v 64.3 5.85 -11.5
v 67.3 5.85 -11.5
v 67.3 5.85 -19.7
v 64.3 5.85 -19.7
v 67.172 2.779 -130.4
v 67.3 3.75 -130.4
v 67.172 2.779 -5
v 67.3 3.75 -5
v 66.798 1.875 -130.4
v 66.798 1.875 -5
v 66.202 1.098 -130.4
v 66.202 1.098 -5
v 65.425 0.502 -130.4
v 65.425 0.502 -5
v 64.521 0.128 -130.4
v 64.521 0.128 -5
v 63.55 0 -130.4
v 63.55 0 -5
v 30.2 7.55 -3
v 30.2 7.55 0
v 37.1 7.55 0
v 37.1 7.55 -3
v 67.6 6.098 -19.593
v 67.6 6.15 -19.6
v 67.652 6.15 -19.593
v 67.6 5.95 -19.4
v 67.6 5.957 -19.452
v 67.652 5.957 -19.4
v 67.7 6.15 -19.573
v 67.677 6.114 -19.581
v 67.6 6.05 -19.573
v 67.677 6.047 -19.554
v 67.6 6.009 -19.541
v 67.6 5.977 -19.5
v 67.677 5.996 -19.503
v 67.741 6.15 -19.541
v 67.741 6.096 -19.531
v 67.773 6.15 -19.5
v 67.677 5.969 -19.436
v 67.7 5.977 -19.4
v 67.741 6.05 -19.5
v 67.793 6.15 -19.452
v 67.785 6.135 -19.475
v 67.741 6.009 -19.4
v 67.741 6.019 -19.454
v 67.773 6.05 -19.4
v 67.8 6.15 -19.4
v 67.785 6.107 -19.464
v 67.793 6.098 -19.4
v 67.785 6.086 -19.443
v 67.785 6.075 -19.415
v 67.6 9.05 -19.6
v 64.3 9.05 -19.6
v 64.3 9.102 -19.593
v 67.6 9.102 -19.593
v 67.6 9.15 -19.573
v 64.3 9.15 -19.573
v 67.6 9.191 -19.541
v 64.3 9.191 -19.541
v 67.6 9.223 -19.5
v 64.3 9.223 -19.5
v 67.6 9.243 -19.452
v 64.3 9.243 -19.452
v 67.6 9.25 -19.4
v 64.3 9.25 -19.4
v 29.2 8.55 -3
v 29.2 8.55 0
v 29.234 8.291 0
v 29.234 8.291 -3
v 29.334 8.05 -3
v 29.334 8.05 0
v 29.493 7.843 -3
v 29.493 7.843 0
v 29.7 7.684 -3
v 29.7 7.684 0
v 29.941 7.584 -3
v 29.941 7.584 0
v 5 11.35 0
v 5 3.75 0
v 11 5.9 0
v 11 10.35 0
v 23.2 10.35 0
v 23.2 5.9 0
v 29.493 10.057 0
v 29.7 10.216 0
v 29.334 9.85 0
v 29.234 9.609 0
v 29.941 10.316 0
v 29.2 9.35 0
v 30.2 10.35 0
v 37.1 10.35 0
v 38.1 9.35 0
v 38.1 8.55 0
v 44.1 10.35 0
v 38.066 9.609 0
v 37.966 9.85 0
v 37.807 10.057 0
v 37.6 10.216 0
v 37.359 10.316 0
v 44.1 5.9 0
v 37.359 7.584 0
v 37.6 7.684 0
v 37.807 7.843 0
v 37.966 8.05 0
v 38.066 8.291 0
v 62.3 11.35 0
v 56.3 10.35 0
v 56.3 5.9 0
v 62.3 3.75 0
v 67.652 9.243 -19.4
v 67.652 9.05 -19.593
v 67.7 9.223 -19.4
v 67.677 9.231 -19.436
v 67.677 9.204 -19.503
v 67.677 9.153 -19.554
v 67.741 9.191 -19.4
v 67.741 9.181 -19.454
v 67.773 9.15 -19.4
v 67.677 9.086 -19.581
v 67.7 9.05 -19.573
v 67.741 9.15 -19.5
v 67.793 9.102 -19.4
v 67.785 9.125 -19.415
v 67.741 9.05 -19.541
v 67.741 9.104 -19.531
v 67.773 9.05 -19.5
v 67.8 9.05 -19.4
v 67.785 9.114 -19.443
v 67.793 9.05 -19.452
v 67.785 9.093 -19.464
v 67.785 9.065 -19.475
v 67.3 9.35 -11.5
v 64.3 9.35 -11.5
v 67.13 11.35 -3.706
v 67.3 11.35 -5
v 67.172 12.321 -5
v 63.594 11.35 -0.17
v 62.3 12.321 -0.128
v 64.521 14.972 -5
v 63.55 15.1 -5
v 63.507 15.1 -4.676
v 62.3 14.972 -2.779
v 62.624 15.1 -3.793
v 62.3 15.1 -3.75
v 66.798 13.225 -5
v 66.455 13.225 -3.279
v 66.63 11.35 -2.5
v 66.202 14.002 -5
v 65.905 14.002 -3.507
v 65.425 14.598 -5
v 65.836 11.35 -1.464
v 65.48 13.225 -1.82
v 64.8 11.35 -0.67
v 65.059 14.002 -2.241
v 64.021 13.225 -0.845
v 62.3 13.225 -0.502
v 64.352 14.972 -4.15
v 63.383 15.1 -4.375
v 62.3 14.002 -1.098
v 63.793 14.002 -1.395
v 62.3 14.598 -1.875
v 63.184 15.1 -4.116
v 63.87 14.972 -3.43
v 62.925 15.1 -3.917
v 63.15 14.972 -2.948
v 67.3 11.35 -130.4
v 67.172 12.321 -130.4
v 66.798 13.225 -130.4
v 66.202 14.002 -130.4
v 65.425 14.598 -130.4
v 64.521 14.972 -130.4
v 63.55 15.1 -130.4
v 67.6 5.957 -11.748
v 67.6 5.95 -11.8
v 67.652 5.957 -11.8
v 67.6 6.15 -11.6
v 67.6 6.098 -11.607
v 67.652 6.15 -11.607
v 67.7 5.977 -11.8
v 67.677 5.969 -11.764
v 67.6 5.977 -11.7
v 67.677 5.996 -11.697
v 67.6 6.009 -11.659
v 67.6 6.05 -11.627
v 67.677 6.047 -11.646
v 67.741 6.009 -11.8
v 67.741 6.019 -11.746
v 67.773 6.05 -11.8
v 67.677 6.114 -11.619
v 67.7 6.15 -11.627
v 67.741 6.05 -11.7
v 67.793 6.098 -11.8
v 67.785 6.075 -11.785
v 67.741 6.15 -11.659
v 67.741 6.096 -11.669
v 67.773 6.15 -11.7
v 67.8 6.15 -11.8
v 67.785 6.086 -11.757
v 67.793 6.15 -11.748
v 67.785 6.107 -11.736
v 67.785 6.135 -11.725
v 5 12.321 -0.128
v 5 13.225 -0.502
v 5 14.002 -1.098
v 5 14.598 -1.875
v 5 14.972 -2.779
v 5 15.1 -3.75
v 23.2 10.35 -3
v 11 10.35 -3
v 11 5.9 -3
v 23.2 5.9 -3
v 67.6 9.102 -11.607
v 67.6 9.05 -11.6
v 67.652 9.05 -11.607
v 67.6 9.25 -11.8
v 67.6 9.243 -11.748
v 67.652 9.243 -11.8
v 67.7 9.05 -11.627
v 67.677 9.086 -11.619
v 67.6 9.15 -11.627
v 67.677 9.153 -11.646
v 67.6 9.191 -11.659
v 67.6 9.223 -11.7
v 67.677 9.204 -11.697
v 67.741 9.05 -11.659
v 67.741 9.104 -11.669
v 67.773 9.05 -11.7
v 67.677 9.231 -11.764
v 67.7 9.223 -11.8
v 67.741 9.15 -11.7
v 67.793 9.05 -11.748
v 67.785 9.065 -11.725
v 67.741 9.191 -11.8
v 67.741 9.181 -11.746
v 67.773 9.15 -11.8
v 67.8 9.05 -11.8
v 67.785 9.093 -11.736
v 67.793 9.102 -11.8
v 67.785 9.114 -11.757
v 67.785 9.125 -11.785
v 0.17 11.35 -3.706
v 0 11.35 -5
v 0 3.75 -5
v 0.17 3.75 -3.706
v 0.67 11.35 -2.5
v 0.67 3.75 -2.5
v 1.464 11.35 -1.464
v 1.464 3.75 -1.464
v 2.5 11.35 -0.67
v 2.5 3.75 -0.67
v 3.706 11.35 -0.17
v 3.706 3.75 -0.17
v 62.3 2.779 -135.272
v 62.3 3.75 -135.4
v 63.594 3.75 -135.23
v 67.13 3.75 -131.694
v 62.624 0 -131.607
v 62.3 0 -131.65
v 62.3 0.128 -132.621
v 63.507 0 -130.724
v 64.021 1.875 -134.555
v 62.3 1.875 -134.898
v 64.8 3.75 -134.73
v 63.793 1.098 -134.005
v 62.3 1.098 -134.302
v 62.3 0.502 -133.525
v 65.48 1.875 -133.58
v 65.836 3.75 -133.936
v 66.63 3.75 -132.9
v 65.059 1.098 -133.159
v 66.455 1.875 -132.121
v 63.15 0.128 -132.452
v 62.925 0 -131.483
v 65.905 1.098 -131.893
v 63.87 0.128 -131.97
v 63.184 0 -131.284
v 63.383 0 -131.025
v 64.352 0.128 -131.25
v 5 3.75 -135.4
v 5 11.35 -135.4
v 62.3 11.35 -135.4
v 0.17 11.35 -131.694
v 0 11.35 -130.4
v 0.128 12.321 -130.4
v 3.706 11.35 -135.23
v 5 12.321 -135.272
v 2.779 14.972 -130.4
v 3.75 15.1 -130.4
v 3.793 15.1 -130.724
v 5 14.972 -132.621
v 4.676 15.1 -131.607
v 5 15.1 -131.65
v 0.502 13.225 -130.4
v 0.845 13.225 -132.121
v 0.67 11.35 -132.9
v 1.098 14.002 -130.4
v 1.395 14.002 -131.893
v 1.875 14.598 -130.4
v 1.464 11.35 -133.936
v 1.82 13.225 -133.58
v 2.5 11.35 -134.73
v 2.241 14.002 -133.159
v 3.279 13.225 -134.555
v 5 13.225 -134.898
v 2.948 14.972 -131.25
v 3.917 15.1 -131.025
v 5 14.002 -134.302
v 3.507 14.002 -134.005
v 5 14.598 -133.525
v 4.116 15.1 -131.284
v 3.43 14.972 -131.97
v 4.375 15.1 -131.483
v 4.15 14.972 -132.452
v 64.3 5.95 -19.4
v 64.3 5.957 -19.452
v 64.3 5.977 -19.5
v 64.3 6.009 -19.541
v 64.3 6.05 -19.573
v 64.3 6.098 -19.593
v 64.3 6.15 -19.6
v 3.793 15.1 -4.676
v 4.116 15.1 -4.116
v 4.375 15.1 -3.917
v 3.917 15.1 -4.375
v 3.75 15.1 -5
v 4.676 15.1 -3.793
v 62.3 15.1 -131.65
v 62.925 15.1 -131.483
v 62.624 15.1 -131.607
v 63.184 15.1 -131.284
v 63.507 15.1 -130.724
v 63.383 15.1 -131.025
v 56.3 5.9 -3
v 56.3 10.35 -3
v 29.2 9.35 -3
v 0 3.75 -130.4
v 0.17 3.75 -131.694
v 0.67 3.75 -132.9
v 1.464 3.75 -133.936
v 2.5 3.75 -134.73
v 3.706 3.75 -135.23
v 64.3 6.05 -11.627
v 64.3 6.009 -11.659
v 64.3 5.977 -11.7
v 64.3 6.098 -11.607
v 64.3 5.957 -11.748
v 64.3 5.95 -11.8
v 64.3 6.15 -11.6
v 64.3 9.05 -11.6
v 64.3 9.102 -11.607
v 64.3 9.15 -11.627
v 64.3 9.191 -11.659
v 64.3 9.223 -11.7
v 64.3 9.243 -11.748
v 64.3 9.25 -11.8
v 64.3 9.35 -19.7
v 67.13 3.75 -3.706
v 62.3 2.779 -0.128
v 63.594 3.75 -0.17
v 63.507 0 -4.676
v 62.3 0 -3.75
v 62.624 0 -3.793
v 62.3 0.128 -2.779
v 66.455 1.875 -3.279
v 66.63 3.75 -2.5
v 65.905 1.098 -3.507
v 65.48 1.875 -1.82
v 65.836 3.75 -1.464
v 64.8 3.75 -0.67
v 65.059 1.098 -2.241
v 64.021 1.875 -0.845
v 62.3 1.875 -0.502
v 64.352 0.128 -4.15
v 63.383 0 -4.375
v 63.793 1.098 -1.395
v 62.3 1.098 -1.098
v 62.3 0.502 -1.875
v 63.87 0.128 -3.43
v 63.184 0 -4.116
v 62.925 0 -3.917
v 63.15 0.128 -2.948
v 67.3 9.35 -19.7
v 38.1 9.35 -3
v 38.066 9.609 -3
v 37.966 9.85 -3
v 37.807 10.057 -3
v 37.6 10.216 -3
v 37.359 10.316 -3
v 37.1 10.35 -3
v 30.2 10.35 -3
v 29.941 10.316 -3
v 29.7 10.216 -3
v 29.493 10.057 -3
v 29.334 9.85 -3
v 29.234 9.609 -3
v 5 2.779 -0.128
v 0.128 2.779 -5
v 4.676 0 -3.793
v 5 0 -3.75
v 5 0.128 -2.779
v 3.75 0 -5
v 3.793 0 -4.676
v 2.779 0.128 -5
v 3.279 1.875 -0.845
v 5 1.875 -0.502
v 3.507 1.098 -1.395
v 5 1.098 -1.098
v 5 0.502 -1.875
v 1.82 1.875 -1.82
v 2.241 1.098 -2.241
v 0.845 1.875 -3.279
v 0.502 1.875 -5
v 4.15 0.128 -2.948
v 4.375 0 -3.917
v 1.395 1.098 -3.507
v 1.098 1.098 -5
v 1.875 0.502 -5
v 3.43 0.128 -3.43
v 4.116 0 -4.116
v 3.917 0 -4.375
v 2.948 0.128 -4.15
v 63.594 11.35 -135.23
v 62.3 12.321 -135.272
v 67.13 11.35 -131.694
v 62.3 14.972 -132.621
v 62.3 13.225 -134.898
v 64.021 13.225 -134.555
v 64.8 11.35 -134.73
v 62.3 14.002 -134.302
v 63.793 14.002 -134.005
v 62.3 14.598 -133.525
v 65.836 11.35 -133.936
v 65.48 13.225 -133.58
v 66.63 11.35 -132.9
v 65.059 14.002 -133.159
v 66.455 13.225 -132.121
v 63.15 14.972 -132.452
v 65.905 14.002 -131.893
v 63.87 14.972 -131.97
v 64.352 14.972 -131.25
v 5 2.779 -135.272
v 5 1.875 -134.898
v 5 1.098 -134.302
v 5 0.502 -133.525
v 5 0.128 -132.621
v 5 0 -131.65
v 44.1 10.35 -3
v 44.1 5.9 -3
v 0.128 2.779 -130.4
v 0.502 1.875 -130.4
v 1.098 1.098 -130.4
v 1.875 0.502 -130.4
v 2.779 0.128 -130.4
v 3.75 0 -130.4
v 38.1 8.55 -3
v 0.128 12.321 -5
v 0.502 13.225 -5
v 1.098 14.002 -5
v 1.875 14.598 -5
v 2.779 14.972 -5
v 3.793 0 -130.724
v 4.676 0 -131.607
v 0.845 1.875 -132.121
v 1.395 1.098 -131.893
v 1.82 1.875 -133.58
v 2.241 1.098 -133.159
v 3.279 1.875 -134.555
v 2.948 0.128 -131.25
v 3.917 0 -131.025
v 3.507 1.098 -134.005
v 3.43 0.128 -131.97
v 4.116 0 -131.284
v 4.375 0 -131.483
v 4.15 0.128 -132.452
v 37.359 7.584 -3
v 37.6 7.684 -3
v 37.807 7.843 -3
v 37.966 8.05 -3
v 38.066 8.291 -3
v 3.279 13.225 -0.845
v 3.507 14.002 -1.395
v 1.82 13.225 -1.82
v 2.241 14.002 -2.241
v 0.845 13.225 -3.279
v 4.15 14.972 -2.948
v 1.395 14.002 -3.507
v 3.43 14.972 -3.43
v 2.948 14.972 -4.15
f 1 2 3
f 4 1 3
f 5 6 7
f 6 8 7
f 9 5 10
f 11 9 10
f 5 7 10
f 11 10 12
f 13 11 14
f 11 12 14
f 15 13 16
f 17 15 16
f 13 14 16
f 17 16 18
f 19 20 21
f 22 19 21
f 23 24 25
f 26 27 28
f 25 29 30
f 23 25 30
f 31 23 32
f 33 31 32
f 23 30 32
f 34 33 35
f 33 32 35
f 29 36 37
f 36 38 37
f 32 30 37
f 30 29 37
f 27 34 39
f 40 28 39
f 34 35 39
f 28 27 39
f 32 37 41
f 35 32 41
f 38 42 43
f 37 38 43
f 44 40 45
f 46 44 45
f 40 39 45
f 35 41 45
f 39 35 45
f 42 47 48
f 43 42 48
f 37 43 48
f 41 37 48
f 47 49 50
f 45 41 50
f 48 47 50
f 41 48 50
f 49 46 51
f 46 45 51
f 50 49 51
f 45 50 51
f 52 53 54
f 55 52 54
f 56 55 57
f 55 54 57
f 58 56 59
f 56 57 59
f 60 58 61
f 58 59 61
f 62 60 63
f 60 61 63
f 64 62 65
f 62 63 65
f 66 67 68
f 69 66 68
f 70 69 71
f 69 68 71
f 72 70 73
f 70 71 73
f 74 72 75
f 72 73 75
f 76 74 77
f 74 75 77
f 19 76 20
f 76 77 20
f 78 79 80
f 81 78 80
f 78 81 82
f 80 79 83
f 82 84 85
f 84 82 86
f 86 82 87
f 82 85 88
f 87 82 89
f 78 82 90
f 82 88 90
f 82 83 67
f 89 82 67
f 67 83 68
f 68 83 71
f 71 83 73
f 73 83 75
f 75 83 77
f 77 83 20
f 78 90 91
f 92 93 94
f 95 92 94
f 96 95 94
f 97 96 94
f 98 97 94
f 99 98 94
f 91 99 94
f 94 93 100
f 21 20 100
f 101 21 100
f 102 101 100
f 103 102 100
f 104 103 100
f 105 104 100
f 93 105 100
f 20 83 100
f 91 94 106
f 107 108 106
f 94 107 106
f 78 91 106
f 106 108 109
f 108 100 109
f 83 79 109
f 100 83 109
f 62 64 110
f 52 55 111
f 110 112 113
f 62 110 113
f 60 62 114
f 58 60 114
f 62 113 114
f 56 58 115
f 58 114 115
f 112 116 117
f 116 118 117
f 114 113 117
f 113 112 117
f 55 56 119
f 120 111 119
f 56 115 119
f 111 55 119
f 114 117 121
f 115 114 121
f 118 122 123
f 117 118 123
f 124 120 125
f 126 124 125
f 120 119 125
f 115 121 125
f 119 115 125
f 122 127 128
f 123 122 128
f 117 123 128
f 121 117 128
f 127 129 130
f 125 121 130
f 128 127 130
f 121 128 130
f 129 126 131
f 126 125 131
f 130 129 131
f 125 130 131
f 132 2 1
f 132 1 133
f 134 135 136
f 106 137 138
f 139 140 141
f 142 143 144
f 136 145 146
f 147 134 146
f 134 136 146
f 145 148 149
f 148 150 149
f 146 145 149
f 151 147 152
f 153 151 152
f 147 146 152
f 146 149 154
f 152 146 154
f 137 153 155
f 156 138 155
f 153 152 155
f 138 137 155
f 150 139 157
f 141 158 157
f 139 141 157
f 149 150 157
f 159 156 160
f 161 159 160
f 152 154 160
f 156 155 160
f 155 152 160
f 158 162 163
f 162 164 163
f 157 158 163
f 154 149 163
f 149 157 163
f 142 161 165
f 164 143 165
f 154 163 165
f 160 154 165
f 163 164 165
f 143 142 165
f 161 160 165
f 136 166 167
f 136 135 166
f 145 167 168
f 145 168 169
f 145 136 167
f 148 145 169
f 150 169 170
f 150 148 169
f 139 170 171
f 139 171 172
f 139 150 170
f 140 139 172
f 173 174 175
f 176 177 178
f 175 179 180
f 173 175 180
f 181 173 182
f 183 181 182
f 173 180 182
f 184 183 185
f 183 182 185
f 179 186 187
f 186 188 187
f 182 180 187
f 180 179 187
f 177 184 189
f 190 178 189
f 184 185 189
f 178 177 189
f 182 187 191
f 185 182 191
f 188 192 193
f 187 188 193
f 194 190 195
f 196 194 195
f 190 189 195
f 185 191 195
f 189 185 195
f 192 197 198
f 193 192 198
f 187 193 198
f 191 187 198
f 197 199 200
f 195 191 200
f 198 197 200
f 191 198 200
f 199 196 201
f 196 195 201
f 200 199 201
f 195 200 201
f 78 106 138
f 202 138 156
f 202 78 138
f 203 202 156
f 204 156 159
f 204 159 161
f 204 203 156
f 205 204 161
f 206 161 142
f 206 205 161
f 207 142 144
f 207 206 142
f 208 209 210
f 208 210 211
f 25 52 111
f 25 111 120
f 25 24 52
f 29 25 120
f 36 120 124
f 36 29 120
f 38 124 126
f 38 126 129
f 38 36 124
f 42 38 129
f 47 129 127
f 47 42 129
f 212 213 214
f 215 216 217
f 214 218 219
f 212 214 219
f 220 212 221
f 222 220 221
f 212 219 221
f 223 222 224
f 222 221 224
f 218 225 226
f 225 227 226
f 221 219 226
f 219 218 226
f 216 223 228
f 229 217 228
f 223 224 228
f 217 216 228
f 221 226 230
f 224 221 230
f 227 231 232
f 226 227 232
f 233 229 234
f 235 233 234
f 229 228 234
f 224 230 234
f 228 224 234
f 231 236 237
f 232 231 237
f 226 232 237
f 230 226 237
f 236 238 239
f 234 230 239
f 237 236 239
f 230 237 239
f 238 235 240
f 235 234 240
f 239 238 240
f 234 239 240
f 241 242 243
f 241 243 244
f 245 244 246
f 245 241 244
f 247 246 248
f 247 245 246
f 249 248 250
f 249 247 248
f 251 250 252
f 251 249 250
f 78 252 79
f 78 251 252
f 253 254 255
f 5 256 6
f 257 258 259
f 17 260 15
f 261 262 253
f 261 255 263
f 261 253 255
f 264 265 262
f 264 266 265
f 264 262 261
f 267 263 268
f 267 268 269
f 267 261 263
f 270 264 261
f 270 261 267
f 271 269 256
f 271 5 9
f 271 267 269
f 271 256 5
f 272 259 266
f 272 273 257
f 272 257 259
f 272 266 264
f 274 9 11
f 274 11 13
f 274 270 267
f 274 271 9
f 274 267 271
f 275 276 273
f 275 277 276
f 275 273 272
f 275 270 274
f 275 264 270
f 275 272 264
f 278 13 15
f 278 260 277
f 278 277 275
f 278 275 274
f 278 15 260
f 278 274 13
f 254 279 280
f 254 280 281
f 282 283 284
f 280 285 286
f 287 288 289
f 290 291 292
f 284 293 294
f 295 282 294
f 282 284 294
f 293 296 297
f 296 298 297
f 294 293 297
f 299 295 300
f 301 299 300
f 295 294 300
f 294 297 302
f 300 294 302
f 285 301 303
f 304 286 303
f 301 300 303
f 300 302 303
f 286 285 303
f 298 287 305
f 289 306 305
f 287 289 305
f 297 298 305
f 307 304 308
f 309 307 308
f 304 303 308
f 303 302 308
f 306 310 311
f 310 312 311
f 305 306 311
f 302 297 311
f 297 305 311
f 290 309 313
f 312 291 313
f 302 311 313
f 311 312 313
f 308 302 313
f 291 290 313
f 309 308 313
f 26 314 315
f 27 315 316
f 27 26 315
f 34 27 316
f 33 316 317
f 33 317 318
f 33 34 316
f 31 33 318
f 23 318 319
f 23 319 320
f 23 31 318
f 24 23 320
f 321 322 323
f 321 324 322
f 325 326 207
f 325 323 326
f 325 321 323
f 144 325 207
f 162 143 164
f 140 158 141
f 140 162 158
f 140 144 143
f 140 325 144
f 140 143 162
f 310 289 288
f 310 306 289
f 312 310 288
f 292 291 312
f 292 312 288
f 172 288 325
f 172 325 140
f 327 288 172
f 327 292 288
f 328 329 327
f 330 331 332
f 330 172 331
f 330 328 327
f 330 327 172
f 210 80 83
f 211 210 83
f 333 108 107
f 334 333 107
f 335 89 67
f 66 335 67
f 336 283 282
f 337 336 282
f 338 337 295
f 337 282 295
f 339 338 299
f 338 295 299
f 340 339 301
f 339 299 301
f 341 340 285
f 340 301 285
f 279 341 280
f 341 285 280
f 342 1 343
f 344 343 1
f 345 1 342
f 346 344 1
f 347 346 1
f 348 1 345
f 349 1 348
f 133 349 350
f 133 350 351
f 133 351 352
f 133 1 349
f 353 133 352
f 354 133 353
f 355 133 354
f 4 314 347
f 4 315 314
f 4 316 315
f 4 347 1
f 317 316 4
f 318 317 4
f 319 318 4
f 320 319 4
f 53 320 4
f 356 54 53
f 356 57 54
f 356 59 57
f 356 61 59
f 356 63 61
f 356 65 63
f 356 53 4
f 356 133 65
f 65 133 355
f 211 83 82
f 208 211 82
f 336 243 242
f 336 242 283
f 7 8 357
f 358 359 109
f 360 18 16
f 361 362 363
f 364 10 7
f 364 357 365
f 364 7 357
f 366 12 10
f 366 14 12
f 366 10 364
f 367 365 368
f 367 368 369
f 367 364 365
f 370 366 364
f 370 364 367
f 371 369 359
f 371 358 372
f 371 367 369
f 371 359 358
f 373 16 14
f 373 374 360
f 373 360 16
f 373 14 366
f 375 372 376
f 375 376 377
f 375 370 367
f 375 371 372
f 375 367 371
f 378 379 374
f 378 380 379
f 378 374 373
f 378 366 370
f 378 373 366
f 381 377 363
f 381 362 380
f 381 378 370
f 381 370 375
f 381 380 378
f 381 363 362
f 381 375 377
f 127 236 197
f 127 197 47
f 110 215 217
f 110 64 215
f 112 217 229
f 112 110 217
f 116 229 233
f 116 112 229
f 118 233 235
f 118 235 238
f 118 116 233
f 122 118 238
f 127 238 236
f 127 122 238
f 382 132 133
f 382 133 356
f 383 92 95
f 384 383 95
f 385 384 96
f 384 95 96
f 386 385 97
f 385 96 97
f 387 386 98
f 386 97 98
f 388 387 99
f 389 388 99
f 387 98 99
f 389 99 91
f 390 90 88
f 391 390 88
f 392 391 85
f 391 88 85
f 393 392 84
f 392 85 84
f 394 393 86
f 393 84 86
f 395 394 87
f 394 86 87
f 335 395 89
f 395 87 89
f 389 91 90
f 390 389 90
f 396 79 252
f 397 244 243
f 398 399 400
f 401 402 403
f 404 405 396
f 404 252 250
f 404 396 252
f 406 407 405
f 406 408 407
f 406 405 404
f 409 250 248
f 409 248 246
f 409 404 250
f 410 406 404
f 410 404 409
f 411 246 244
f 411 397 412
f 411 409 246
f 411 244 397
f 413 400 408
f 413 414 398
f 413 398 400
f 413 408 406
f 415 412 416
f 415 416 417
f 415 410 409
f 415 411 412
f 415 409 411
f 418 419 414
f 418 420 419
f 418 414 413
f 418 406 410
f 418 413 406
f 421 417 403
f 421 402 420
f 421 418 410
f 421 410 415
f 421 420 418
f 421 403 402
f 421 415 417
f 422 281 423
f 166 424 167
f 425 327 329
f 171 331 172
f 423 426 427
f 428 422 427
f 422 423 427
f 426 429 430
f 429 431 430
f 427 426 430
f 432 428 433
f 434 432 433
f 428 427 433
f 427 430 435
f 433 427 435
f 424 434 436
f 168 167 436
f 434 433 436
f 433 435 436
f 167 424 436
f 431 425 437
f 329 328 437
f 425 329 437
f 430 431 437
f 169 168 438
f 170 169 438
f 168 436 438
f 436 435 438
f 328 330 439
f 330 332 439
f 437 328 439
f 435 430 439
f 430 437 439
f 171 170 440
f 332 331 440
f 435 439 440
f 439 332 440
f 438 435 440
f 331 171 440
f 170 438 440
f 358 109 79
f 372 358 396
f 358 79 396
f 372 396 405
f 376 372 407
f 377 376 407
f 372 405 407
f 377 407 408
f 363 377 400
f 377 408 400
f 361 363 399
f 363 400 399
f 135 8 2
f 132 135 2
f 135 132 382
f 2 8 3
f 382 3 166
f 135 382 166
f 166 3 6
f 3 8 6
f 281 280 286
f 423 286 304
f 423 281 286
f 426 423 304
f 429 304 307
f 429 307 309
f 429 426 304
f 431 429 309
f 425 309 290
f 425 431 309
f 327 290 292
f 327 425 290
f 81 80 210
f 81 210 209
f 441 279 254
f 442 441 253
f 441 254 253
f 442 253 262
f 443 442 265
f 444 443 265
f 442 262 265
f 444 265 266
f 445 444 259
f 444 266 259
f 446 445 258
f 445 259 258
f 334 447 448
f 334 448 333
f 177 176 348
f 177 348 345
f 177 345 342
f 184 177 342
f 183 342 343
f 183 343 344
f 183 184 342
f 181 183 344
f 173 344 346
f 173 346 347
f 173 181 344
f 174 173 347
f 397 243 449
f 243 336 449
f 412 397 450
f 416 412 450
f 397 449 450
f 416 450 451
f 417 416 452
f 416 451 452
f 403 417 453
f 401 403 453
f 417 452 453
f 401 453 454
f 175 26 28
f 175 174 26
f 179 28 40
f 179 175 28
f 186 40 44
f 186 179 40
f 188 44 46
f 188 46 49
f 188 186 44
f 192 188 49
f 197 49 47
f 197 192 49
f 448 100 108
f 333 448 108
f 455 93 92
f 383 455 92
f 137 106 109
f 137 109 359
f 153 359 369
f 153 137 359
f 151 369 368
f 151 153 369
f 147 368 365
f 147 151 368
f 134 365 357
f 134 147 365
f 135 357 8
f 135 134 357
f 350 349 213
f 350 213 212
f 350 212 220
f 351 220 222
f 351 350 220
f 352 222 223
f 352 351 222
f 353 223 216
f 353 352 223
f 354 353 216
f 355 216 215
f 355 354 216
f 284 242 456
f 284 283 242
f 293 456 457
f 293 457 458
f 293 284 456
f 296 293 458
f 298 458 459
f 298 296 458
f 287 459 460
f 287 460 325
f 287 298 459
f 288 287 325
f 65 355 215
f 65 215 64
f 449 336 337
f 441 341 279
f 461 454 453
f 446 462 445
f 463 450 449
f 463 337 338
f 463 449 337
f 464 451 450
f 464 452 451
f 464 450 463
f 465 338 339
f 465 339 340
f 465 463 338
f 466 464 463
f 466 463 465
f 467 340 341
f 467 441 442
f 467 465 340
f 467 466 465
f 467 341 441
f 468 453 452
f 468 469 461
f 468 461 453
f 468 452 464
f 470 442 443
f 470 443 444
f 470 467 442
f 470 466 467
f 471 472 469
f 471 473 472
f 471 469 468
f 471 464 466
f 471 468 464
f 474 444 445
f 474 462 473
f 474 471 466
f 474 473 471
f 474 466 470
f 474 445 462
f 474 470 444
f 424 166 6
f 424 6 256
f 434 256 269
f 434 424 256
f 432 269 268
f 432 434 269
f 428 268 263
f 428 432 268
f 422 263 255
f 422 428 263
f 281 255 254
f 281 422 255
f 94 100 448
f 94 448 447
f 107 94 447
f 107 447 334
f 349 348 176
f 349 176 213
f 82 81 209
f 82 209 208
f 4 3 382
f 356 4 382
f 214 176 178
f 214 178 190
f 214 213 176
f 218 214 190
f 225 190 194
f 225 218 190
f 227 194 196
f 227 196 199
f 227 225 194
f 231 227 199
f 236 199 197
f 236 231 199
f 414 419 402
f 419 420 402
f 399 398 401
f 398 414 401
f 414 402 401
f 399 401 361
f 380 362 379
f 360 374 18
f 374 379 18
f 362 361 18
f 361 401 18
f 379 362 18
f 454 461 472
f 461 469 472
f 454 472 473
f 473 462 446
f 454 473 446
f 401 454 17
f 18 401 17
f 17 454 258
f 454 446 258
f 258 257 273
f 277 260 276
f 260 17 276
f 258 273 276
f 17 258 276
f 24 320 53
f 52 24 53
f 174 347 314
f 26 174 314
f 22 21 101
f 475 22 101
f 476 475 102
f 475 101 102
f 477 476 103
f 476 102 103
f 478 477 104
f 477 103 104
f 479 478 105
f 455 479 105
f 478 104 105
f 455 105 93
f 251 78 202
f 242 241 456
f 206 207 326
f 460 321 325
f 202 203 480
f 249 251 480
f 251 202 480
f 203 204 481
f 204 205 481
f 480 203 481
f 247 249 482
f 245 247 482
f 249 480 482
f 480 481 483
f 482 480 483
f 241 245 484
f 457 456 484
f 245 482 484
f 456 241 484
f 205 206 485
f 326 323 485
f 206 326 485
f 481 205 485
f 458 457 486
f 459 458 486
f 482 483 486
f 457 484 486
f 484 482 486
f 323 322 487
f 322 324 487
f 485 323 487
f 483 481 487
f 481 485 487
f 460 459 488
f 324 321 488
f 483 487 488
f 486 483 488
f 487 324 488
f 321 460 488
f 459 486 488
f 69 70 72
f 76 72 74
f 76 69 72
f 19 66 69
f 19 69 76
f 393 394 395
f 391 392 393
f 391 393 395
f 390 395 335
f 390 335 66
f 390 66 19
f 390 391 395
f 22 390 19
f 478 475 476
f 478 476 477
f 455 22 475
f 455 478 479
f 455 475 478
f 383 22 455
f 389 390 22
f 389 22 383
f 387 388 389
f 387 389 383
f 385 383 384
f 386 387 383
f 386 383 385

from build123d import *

# Parameters (mm, degrees)
SKETCH1_W           = 67.3
SKETCH1_H           = 135.4
BOSS_EXTRUDE1_DEPTH = 15.1
FILLET1_R           = 5
FILLET2_R           = 3.75
SKETCH2_W           = 12.2
SKETCH2_H           = 4.45
CUT_EXTRUDE1_DEPTH  = 3
SKETCH3_W           = 8.2
SKETCH3_H           = 3.5
SKETCH3_W_2         = 8
SKETCH3_H_2         = 3.3
CUT_EXTRUDE2_DEPTH  = 3
FILLET3_R           = 3.75
SKETCH4_W           = 8
SKETCH4_H           = 3.3
BOSS_EXTRUDE2_DEPTH = 0.5
FILLET4_R           = 0.2
FILLET5_R           = 0.2


with BuildPart() as part:
    # Sketch1 → Boss-Extrude1 (new body)
    with BuildSketch(Plane(origin=(0, 0, 0), x_dir=(1, 0, 0), z_dir=(0, 1, 0))):
        with Locations((33.65, 67.7)):
            Rectangle(SKETCH1_W, SKETCH1_H)
    extrude(amount=BOSS_EXTRUDE1_DEPTH)

    # Fillet1
    fillet1_edges = [part.edges().sort_by_distance(p)[0] for p in [
        (0, 7.55, -135.4),
        (67.3, 7.55, -135.4),
        (67.3, 7.55, 0),
        (0, 7.55, 0),
    ]]
    fillet(fillet1_edges, radius=FILLET1_R)

    # Fillet2
    fillet2_edges = [part.edges().sort_by_distance(p)[0] for p in [
        (0, 15.1, -67.7),
        (33.65, 15.1, -135.4),
        (33.65, 15.1, 0),
        (67.3, 15.1, -67.7),
        (1.464466094, 15.1, -1.464466094),
        (65.835533906, 15.1, -1.464466094),
        (65.835533906, 15.1, -133.935533906),
        (1.464466094, 15.1, -133.935533906),
    ]]
    fillet(fillet2_edges, radius=FILLET2_R)

    # Sketch2 → Cut-Extrude1 (cut)
    with BuildSketch(Plane.XY):
        with Locations((17.1, 8.125)):
            Rectangle(SKETCH2_W, SKETCH2_H)
        with Locations((50.2, 8.125)):
            Rectangle(SKETCH2_W, SKETCH2_H)
        with BuildLine():
            Line((30.2, 7.55), (37.1, 7.55))
            ThreePointArc((37.1, 7.55), (37.807106781, 7.842893219), (38.1, 8.55))
            Line((38.1, 8.55), (38.1, 9.35))
            ThreePointArc((38.1, 9.35), (37.807106781, 10.057106781), (37.1, 10.35))
            Line((37.1, 10.35), (30.2, 10.35))
            ThreePointArc((30.2, 10.35), (29.492893219, 10.057106781), (29.2, 9.35))
            Line((29.2, 9.35), (29.2, 8.55))
            ThreePointArc((29.2, 8.55), (29.492893219, 7.842893219), (30.2, 7.55))
        make_face()
    extrude(amount=-CUT_EXTRUDE1_DEPTH, mode=Mode.SUBTRACT)

    # Sketch3 → Cut-Extrude2 (cut)
    with BuildSketch(Plane(origin=(67.3, 0, 0), x_dir=(0, 0, -1), z_dir=(1, 0, 0))):
        with Locations((15.6, 7.6)):
            Rectangle(SKETCH3_W, SKETCH3_H)
        with Locations((15.6, 7.6)):
            Rectangle(SKETCH3_W_2, SKETCH3_H_2, mode=Mode.SUBTRACT)
    extrude(amount=-CUT_EXTRUDE2_DEPTH, mode=Mode.SUBTRACT)

    # Fillet3
    fillet3_edges = [part.edges().sort_by_distance(p)[0] for p in [
        (0, 0, -67.7),
        (33.65, 0, -135.4),
        (67.3, 0, -67.7),
        (33.65, 0, 0),
        (1.464466094, 0, -1.464466094),
        (65.835533906, 0, -1.464466094),
        (65.835533906, 0, -133.935533906),
        (1.464466094, 0, -133.935533906),
    ]]
    fillet(fillet3_edges, radius=FILLET3_R)

    # Sketch4 → Boss-Extrude2 (add)
    with BuildSketch(Plane(origin=(67.3, 0, 0), x_dir=(0, 0, -1), z_dir=(1, 0, 0))):
        with Locations((15.6, 7.6)):
            Rectangle(SKETCH4_W, SKETCH4_H)
    extrude(amount=BOSS_EXTRUDE2_DEPTH)

    # Fillet4
    fillet4_edges = [part.edges().sort_by_distance(p)[0] for p in [
        (66.05, 9.25, -11.6),
        (66.05, 9.25, -19.6),
        (66.05, 5.95, -19.6),
        (66.05, 5.95, -11.6),
    ]]
    fillet(fillet4_edges, radius=FILLET4_R)

    # Fillet5
    fillet5_edges = [part.edges().sort_by_distance(p)[0] for p in [
        (67.8, 7.6, -11.6),
        (67.8, 5.95, -15.6),
        (67.8, 7.6, -19.6),
        (67.8, 9.25, -15.6),
        (67.8, 9.191421356, -11.658578644),
        (67.8, 9.191421356, -19.541421356),
        (67.8, 6.008578644, -19.541421356),
        (67.8, 6.008578644, -11.658578644),
    ]]
    fillet(fillet5_edges, radius=FILLET5_R)


solid = part.part
